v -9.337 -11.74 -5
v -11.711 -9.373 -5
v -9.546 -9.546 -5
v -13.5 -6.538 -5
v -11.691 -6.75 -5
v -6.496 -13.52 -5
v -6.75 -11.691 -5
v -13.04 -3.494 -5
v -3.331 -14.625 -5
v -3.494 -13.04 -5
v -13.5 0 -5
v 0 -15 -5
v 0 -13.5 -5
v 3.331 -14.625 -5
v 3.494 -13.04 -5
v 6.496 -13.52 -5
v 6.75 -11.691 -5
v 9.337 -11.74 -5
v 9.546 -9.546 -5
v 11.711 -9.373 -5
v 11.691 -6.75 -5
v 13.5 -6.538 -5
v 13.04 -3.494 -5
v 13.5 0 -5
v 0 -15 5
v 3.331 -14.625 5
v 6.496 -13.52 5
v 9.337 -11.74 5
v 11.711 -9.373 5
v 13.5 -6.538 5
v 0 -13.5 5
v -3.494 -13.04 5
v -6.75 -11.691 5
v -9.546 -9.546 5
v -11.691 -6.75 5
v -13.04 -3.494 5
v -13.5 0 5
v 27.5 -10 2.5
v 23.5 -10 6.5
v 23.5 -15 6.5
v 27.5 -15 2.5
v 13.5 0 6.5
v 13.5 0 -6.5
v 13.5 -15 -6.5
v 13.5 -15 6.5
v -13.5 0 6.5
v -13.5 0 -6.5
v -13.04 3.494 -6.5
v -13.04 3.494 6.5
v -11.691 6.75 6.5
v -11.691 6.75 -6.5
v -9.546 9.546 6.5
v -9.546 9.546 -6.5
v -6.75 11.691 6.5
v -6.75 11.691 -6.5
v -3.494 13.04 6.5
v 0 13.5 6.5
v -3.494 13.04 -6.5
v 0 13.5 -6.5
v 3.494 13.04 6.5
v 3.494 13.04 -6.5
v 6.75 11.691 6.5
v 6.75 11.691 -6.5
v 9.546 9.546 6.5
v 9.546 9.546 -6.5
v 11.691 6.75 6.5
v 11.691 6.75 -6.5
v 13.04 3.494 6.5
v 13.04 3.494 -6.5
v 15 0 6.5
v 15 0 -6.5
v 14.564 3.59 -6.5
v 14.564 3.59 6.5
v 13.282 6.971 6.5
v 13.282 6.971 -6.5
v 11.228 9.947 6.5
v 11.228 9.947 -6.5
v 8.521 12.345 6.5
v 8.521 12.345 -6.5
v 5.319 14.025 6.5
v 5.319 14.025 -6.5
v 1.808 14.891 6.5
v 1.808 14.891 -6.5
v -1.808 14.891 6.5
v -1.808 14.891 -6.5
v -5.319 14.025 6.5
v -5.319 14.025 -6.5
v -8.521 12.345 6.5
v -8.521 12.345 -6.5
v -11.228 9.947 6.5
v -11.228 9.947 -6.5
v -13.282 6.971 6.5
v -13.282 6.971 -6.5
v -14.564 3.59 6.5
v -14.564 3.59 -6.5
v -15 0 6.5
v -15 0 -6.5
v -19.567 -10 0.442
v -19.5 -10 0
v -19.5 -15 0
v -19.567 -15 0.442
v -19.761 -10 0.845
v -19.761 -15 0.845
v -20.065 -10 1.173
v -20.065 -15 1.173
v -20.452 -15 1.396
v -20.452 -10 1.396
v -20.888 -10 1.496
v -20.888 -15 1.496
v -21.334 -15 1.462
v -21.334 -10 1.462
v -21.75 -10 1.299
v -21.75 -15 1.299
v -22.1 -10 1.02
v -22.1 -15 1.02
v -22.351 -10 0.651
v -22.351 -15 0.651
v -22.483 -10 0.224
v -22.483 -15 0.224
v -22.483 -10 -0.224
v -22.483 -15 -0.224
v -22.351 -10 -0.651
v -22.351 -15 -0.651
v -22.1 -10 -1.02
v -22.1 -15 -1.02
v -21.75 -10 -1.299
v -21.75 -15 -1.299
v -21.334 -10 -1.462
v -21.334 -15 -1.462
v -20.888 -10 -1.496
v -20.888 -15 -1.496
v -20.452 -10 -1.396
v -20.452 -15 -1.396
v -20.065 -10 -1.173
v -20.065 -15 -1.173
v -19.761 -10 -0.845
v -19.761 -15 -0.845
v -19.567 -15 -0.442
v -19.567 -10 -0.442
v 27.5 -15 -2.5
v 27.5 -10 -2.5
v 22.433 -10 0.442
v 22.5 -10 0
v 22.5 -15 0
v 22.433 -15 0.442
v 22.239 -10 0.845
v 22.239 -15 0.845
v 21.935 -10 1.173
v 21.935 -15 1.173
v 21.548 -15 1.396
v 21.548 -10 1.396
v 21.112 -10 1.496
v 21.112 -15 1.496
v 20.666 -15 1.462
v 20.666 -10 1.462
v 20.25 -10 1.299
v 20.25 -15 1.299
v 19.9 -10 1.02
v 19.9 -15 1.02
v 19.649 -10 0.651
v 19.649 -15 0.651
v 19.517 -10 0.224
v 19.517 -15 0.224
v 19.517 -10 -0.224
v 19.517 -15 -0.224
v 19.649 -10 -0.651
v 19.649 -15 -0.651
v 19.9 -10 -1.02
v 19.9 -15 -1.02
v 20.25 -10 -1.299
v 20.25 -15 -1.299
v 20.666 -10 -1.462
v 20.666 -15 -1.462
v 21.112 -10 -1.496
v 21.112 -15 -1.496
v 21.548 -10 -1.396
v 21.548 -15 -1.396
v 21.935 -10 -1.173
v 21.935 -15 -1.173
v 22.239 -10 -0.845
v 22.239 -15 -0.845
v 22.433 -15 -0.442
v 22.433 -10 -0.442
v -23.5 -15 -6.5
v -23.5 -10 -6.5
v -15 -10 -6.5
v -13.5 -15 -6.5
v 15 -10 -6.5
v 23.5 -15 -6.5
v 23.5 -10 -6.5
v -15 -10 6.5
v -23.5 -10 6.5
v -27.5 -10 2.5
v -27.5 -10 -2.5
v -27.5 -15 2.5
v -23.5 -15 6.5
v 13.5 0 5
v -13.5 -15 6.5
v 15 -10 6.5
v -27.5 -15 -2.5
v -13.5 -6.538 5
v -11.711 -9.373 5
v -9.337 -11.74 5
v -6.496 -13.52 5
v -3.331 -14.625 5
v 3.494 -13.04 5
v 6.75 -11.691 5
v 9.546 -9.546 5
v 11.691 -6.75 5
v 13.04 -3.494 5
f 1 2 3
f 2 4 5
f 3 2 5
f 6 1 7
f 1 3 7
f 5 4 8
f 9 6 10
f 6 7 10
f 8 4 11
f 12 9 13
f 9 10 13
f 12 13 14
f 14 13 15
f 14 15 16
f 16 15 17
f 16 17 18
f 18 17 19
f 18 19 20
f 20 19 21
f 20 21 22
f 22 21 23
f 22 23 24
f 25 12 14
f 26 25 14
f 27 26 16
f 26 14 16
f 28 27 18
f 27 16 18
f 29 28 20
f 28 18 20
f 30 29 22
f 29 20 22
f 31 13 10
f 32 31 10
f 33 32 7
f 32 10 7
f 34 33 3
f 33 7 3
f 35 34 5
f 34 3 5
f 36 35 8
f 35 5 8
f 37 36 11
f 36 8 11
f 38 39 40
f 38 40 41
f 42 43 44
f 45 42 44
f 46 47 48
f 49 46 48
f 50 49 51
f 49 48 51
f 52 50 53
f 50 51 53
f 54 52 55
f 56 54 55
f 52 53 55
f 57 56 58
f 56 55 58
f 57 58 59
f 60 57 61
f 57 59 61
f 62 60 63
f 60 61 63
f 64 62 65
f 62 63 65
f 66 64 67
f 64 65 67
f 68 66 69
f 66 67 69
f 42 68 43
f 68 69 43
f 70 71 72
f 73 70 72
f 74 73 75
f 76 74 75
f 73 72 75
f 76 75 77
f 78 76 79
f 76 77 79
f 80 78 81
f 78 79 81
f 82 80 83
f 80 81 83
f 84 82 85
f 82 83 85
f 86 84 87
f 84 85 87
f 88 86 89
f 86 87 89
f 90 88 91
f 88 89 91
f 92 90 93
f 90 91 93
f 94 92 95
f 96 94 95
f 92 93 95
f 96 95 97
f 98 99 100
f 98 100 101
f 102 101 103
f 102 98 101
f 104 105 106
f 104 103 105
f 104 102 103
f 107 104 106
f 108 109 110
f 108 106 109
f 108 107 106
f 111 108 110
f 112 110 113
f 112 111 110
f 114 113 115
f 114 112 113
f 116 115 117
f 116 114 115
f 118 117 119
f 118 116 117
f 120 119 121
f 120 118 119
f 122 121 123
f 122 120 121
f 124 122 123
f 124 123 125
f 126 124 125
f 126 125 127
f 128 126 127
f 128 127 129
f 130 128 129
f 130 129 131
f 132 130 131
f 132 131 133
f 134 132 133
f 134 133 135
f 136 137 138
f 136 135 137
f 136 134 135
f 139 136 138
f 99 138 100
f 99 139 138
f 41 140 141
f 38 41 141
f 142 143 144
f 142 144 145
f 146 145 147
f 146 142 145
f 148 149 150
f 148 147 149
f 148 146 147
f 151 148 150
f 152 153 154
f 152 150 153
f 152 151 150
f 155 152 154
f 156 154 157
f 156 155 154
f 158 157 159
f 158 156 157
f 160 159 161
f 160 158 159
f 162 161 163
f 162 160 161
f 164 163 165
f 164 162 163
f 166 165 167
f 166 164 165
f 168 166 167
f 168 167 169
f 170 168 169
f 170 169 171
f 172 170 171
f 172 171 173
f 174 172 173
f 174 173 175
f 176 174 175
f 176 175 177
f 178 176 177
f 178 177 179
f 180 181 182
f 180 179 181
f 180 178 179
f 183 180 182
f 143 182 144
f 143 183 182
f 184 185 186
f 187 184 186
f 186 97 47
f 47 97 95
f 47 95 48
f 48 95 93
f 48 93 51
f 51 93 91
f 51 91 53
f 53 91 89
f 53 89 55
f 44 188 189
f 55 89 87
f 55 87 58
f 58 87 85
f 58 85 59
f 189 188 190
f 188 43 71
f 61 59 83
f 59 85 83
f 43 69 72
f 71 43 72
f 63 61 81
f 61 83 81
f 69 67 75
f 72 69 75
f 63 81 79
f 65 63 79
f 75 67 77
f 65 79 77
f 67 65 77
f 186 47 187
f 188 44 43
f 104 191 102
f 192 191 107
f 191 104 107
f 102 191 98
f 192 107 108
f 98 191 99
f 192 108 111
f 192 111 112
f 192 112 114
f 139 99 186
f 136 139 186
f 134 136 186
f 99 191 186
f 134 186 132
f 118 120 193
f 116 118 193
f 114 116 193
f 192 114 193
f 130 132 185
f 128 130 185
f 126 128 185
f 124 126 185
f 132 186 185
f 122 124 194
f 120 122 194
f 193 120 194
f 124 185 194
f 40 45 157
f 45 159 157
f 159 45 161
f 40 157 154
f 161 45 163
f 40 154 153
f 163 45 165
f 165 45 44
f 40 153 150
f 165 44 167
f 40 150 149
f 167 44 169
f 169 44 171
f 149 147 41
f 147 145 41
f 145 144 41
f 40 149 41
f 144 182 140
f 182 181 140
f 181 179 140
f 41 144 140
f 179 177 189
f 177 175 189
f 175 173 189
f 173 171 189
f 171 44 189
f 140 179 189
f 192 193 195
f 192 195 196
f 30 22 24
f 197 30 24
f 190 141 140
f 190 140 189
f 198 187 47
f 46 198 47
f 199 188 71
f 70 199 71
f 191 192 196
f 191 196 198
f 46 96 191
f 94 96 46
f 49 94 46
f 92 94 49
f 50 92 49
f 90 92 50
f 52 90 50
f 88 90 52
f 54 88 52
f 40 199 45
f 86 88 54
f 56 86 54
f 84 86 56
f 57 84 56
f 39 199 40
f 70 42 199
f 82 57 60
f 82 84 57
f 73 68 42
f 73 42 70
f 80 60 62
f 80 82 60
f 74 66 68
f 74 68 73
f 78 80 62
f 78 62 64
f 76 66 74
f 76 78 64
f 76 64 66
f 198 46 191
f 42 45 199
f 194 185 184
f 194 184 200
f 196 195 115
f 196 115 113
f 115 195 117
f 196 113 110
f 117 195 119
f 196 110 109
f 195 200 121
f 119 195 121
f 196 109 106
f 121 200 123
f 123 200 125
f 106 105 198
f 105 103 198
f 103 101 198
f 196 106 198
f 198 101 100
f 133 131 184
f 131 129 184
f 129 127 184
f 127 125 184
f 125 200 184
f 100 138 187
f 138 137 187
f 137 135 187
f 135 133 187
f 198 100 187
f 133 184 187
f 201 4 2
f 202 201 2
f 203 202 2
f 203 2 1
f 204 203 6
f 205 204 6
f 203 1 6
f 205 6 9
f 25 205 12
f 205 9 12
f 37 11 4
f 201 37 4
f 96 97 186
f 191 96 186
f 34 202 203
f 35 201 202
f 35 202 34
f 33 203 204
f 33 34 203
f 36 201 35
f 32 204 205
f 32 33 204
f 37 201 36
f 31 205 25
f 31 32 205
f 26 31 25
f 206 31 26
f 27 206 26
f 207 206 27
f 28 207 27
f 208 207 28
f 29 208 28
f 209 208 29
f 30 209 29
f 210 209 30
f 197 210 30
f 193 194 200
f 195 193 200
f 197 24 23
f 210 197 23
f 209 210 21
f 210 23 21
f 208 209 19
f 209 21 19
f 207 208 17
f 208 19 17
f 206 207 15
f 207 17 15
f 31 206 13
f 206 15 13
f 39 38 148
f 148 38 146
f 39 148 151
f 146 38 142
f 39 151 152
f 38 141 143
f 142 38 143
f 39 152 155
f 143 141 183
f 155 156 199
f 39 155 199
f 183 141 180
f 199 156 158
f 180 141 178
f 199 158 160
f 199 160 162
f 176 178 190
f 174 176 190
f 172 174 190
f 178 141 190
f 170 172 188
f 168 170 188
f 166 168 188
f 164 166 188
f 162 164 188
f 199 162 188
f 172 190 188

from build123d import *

# Parameters (mm, degrees)
EXTRUDE_5_DEPTH          = 6.5
EXTRUDE_5_DEPTH_BACK     = 6.5
EXTRUDE_6_DEPTH          = 5
EXTRUDE_6_DEPTH_BACK     = 5
CUT_EXTRUDE_1_DEPTH      = 42.21286207
CUT_EXTRUDE_1_DEPTH_BACK = 42.21286207
SKETCH_2_R               = 1.5


with BuildPart() as part:
    # 草图1 → 凸台-拉伸5 (new, two sides: drawn at the far end of the back side and taken through both)
    with BuildSketch(Plane.XY.offset(-EXTRUDE_5_DEPTH_BACK)):
        with BuildLine():
            ThreePointArc((15, 0), (0, 15), (-15, 0))
            Line((-15, 0), (-15, -10))
            Line((-15, -10), (-27.5, -10))
            Line((-27.5, -10), (-27.5, -15))
            Line((-27.5, -15), (-13.5, -15))
            Line((-13.5, -15), (-13.5, -6.538348415))
            Line((-13.5, -6.538348415), (-13.5, 0))
            ThreePointArc((-13.5, 0), (0, 13.5), (13.5, 0))
            Line((13.5, 0), (13.5, -6.538348415))
            Line((13.5, -6.538348415), (13.5, -15))
            Line((13.5, -15), (27.5, -15))
            Line((27.5, -15), (27.5, -10))
            Line((27.5, -10), (15, -10))
            Line((15, -10), (15, 0))
        make_face()
    extrude(amount=EXTRUDE_5_DEPTH + EXTRUDE_5_DEPTH_BACK)

    # 草图2 → 切除-拉伸1 (cut, two sides: drawn at the far end of the back side and taken through both)
    with BuildSketch(Plane.XZ.offset(15).offset(-CUT_EXTRUDE_1_DEPTH_BACK)):
        with Locations((-21, 0)):
            Circle(SKETCH_2_R)
        with Locations((21, 0)):
            Circle(SKETCH_2_R)
        Polygon((-27.5, 2.5), (-23.5, 6.5), (-27.5, 6.5), align=None)
        Polygon((-27.5, -6.5), (-23.5, -6.5), (-27.5, -2.5), align=None)
        Polygon((27.5, 6.5), (23.5, 6.5), (27.5, 2.5), align=None)
        Polygon((27.5, -2.5), (23.5, -6.5), (27.5, -6.5), align=None)
    extrude(amount=CUT_EXTRUDE_1_DEPTH + CUT_EXTRUDE_1_DEPTH_BACK, mode=Mode.SUBTRACT)


with BuildPart() as body_2:
    # 草图1<7> → 凸台-拉伸6 (new, two sides: drawn at the far end of the back side and taken through both)
    with BuildSketch(Plane.XY.offset(-EXTRUDE_6_DEPTH_BACK)):
        with BuildLine():
            ThreePointArc((-13.5, -6.538348415), (0, -15), (13.5, -6.538348415))
            Line((13.5, -6.538348415), (13.5, 0))
            ThreePointArc((13.5, 0), (0, -13.5), (-13.5, 0))
            Line((-13.5, 0), (-13.5, -6.538348415))
        make_face()
    extrude(amount=EXTRUDE_6_DEPTH + EXTRUDE_6_DEPTH_BACK)


solid = Compound([part.part, body_2.part])
